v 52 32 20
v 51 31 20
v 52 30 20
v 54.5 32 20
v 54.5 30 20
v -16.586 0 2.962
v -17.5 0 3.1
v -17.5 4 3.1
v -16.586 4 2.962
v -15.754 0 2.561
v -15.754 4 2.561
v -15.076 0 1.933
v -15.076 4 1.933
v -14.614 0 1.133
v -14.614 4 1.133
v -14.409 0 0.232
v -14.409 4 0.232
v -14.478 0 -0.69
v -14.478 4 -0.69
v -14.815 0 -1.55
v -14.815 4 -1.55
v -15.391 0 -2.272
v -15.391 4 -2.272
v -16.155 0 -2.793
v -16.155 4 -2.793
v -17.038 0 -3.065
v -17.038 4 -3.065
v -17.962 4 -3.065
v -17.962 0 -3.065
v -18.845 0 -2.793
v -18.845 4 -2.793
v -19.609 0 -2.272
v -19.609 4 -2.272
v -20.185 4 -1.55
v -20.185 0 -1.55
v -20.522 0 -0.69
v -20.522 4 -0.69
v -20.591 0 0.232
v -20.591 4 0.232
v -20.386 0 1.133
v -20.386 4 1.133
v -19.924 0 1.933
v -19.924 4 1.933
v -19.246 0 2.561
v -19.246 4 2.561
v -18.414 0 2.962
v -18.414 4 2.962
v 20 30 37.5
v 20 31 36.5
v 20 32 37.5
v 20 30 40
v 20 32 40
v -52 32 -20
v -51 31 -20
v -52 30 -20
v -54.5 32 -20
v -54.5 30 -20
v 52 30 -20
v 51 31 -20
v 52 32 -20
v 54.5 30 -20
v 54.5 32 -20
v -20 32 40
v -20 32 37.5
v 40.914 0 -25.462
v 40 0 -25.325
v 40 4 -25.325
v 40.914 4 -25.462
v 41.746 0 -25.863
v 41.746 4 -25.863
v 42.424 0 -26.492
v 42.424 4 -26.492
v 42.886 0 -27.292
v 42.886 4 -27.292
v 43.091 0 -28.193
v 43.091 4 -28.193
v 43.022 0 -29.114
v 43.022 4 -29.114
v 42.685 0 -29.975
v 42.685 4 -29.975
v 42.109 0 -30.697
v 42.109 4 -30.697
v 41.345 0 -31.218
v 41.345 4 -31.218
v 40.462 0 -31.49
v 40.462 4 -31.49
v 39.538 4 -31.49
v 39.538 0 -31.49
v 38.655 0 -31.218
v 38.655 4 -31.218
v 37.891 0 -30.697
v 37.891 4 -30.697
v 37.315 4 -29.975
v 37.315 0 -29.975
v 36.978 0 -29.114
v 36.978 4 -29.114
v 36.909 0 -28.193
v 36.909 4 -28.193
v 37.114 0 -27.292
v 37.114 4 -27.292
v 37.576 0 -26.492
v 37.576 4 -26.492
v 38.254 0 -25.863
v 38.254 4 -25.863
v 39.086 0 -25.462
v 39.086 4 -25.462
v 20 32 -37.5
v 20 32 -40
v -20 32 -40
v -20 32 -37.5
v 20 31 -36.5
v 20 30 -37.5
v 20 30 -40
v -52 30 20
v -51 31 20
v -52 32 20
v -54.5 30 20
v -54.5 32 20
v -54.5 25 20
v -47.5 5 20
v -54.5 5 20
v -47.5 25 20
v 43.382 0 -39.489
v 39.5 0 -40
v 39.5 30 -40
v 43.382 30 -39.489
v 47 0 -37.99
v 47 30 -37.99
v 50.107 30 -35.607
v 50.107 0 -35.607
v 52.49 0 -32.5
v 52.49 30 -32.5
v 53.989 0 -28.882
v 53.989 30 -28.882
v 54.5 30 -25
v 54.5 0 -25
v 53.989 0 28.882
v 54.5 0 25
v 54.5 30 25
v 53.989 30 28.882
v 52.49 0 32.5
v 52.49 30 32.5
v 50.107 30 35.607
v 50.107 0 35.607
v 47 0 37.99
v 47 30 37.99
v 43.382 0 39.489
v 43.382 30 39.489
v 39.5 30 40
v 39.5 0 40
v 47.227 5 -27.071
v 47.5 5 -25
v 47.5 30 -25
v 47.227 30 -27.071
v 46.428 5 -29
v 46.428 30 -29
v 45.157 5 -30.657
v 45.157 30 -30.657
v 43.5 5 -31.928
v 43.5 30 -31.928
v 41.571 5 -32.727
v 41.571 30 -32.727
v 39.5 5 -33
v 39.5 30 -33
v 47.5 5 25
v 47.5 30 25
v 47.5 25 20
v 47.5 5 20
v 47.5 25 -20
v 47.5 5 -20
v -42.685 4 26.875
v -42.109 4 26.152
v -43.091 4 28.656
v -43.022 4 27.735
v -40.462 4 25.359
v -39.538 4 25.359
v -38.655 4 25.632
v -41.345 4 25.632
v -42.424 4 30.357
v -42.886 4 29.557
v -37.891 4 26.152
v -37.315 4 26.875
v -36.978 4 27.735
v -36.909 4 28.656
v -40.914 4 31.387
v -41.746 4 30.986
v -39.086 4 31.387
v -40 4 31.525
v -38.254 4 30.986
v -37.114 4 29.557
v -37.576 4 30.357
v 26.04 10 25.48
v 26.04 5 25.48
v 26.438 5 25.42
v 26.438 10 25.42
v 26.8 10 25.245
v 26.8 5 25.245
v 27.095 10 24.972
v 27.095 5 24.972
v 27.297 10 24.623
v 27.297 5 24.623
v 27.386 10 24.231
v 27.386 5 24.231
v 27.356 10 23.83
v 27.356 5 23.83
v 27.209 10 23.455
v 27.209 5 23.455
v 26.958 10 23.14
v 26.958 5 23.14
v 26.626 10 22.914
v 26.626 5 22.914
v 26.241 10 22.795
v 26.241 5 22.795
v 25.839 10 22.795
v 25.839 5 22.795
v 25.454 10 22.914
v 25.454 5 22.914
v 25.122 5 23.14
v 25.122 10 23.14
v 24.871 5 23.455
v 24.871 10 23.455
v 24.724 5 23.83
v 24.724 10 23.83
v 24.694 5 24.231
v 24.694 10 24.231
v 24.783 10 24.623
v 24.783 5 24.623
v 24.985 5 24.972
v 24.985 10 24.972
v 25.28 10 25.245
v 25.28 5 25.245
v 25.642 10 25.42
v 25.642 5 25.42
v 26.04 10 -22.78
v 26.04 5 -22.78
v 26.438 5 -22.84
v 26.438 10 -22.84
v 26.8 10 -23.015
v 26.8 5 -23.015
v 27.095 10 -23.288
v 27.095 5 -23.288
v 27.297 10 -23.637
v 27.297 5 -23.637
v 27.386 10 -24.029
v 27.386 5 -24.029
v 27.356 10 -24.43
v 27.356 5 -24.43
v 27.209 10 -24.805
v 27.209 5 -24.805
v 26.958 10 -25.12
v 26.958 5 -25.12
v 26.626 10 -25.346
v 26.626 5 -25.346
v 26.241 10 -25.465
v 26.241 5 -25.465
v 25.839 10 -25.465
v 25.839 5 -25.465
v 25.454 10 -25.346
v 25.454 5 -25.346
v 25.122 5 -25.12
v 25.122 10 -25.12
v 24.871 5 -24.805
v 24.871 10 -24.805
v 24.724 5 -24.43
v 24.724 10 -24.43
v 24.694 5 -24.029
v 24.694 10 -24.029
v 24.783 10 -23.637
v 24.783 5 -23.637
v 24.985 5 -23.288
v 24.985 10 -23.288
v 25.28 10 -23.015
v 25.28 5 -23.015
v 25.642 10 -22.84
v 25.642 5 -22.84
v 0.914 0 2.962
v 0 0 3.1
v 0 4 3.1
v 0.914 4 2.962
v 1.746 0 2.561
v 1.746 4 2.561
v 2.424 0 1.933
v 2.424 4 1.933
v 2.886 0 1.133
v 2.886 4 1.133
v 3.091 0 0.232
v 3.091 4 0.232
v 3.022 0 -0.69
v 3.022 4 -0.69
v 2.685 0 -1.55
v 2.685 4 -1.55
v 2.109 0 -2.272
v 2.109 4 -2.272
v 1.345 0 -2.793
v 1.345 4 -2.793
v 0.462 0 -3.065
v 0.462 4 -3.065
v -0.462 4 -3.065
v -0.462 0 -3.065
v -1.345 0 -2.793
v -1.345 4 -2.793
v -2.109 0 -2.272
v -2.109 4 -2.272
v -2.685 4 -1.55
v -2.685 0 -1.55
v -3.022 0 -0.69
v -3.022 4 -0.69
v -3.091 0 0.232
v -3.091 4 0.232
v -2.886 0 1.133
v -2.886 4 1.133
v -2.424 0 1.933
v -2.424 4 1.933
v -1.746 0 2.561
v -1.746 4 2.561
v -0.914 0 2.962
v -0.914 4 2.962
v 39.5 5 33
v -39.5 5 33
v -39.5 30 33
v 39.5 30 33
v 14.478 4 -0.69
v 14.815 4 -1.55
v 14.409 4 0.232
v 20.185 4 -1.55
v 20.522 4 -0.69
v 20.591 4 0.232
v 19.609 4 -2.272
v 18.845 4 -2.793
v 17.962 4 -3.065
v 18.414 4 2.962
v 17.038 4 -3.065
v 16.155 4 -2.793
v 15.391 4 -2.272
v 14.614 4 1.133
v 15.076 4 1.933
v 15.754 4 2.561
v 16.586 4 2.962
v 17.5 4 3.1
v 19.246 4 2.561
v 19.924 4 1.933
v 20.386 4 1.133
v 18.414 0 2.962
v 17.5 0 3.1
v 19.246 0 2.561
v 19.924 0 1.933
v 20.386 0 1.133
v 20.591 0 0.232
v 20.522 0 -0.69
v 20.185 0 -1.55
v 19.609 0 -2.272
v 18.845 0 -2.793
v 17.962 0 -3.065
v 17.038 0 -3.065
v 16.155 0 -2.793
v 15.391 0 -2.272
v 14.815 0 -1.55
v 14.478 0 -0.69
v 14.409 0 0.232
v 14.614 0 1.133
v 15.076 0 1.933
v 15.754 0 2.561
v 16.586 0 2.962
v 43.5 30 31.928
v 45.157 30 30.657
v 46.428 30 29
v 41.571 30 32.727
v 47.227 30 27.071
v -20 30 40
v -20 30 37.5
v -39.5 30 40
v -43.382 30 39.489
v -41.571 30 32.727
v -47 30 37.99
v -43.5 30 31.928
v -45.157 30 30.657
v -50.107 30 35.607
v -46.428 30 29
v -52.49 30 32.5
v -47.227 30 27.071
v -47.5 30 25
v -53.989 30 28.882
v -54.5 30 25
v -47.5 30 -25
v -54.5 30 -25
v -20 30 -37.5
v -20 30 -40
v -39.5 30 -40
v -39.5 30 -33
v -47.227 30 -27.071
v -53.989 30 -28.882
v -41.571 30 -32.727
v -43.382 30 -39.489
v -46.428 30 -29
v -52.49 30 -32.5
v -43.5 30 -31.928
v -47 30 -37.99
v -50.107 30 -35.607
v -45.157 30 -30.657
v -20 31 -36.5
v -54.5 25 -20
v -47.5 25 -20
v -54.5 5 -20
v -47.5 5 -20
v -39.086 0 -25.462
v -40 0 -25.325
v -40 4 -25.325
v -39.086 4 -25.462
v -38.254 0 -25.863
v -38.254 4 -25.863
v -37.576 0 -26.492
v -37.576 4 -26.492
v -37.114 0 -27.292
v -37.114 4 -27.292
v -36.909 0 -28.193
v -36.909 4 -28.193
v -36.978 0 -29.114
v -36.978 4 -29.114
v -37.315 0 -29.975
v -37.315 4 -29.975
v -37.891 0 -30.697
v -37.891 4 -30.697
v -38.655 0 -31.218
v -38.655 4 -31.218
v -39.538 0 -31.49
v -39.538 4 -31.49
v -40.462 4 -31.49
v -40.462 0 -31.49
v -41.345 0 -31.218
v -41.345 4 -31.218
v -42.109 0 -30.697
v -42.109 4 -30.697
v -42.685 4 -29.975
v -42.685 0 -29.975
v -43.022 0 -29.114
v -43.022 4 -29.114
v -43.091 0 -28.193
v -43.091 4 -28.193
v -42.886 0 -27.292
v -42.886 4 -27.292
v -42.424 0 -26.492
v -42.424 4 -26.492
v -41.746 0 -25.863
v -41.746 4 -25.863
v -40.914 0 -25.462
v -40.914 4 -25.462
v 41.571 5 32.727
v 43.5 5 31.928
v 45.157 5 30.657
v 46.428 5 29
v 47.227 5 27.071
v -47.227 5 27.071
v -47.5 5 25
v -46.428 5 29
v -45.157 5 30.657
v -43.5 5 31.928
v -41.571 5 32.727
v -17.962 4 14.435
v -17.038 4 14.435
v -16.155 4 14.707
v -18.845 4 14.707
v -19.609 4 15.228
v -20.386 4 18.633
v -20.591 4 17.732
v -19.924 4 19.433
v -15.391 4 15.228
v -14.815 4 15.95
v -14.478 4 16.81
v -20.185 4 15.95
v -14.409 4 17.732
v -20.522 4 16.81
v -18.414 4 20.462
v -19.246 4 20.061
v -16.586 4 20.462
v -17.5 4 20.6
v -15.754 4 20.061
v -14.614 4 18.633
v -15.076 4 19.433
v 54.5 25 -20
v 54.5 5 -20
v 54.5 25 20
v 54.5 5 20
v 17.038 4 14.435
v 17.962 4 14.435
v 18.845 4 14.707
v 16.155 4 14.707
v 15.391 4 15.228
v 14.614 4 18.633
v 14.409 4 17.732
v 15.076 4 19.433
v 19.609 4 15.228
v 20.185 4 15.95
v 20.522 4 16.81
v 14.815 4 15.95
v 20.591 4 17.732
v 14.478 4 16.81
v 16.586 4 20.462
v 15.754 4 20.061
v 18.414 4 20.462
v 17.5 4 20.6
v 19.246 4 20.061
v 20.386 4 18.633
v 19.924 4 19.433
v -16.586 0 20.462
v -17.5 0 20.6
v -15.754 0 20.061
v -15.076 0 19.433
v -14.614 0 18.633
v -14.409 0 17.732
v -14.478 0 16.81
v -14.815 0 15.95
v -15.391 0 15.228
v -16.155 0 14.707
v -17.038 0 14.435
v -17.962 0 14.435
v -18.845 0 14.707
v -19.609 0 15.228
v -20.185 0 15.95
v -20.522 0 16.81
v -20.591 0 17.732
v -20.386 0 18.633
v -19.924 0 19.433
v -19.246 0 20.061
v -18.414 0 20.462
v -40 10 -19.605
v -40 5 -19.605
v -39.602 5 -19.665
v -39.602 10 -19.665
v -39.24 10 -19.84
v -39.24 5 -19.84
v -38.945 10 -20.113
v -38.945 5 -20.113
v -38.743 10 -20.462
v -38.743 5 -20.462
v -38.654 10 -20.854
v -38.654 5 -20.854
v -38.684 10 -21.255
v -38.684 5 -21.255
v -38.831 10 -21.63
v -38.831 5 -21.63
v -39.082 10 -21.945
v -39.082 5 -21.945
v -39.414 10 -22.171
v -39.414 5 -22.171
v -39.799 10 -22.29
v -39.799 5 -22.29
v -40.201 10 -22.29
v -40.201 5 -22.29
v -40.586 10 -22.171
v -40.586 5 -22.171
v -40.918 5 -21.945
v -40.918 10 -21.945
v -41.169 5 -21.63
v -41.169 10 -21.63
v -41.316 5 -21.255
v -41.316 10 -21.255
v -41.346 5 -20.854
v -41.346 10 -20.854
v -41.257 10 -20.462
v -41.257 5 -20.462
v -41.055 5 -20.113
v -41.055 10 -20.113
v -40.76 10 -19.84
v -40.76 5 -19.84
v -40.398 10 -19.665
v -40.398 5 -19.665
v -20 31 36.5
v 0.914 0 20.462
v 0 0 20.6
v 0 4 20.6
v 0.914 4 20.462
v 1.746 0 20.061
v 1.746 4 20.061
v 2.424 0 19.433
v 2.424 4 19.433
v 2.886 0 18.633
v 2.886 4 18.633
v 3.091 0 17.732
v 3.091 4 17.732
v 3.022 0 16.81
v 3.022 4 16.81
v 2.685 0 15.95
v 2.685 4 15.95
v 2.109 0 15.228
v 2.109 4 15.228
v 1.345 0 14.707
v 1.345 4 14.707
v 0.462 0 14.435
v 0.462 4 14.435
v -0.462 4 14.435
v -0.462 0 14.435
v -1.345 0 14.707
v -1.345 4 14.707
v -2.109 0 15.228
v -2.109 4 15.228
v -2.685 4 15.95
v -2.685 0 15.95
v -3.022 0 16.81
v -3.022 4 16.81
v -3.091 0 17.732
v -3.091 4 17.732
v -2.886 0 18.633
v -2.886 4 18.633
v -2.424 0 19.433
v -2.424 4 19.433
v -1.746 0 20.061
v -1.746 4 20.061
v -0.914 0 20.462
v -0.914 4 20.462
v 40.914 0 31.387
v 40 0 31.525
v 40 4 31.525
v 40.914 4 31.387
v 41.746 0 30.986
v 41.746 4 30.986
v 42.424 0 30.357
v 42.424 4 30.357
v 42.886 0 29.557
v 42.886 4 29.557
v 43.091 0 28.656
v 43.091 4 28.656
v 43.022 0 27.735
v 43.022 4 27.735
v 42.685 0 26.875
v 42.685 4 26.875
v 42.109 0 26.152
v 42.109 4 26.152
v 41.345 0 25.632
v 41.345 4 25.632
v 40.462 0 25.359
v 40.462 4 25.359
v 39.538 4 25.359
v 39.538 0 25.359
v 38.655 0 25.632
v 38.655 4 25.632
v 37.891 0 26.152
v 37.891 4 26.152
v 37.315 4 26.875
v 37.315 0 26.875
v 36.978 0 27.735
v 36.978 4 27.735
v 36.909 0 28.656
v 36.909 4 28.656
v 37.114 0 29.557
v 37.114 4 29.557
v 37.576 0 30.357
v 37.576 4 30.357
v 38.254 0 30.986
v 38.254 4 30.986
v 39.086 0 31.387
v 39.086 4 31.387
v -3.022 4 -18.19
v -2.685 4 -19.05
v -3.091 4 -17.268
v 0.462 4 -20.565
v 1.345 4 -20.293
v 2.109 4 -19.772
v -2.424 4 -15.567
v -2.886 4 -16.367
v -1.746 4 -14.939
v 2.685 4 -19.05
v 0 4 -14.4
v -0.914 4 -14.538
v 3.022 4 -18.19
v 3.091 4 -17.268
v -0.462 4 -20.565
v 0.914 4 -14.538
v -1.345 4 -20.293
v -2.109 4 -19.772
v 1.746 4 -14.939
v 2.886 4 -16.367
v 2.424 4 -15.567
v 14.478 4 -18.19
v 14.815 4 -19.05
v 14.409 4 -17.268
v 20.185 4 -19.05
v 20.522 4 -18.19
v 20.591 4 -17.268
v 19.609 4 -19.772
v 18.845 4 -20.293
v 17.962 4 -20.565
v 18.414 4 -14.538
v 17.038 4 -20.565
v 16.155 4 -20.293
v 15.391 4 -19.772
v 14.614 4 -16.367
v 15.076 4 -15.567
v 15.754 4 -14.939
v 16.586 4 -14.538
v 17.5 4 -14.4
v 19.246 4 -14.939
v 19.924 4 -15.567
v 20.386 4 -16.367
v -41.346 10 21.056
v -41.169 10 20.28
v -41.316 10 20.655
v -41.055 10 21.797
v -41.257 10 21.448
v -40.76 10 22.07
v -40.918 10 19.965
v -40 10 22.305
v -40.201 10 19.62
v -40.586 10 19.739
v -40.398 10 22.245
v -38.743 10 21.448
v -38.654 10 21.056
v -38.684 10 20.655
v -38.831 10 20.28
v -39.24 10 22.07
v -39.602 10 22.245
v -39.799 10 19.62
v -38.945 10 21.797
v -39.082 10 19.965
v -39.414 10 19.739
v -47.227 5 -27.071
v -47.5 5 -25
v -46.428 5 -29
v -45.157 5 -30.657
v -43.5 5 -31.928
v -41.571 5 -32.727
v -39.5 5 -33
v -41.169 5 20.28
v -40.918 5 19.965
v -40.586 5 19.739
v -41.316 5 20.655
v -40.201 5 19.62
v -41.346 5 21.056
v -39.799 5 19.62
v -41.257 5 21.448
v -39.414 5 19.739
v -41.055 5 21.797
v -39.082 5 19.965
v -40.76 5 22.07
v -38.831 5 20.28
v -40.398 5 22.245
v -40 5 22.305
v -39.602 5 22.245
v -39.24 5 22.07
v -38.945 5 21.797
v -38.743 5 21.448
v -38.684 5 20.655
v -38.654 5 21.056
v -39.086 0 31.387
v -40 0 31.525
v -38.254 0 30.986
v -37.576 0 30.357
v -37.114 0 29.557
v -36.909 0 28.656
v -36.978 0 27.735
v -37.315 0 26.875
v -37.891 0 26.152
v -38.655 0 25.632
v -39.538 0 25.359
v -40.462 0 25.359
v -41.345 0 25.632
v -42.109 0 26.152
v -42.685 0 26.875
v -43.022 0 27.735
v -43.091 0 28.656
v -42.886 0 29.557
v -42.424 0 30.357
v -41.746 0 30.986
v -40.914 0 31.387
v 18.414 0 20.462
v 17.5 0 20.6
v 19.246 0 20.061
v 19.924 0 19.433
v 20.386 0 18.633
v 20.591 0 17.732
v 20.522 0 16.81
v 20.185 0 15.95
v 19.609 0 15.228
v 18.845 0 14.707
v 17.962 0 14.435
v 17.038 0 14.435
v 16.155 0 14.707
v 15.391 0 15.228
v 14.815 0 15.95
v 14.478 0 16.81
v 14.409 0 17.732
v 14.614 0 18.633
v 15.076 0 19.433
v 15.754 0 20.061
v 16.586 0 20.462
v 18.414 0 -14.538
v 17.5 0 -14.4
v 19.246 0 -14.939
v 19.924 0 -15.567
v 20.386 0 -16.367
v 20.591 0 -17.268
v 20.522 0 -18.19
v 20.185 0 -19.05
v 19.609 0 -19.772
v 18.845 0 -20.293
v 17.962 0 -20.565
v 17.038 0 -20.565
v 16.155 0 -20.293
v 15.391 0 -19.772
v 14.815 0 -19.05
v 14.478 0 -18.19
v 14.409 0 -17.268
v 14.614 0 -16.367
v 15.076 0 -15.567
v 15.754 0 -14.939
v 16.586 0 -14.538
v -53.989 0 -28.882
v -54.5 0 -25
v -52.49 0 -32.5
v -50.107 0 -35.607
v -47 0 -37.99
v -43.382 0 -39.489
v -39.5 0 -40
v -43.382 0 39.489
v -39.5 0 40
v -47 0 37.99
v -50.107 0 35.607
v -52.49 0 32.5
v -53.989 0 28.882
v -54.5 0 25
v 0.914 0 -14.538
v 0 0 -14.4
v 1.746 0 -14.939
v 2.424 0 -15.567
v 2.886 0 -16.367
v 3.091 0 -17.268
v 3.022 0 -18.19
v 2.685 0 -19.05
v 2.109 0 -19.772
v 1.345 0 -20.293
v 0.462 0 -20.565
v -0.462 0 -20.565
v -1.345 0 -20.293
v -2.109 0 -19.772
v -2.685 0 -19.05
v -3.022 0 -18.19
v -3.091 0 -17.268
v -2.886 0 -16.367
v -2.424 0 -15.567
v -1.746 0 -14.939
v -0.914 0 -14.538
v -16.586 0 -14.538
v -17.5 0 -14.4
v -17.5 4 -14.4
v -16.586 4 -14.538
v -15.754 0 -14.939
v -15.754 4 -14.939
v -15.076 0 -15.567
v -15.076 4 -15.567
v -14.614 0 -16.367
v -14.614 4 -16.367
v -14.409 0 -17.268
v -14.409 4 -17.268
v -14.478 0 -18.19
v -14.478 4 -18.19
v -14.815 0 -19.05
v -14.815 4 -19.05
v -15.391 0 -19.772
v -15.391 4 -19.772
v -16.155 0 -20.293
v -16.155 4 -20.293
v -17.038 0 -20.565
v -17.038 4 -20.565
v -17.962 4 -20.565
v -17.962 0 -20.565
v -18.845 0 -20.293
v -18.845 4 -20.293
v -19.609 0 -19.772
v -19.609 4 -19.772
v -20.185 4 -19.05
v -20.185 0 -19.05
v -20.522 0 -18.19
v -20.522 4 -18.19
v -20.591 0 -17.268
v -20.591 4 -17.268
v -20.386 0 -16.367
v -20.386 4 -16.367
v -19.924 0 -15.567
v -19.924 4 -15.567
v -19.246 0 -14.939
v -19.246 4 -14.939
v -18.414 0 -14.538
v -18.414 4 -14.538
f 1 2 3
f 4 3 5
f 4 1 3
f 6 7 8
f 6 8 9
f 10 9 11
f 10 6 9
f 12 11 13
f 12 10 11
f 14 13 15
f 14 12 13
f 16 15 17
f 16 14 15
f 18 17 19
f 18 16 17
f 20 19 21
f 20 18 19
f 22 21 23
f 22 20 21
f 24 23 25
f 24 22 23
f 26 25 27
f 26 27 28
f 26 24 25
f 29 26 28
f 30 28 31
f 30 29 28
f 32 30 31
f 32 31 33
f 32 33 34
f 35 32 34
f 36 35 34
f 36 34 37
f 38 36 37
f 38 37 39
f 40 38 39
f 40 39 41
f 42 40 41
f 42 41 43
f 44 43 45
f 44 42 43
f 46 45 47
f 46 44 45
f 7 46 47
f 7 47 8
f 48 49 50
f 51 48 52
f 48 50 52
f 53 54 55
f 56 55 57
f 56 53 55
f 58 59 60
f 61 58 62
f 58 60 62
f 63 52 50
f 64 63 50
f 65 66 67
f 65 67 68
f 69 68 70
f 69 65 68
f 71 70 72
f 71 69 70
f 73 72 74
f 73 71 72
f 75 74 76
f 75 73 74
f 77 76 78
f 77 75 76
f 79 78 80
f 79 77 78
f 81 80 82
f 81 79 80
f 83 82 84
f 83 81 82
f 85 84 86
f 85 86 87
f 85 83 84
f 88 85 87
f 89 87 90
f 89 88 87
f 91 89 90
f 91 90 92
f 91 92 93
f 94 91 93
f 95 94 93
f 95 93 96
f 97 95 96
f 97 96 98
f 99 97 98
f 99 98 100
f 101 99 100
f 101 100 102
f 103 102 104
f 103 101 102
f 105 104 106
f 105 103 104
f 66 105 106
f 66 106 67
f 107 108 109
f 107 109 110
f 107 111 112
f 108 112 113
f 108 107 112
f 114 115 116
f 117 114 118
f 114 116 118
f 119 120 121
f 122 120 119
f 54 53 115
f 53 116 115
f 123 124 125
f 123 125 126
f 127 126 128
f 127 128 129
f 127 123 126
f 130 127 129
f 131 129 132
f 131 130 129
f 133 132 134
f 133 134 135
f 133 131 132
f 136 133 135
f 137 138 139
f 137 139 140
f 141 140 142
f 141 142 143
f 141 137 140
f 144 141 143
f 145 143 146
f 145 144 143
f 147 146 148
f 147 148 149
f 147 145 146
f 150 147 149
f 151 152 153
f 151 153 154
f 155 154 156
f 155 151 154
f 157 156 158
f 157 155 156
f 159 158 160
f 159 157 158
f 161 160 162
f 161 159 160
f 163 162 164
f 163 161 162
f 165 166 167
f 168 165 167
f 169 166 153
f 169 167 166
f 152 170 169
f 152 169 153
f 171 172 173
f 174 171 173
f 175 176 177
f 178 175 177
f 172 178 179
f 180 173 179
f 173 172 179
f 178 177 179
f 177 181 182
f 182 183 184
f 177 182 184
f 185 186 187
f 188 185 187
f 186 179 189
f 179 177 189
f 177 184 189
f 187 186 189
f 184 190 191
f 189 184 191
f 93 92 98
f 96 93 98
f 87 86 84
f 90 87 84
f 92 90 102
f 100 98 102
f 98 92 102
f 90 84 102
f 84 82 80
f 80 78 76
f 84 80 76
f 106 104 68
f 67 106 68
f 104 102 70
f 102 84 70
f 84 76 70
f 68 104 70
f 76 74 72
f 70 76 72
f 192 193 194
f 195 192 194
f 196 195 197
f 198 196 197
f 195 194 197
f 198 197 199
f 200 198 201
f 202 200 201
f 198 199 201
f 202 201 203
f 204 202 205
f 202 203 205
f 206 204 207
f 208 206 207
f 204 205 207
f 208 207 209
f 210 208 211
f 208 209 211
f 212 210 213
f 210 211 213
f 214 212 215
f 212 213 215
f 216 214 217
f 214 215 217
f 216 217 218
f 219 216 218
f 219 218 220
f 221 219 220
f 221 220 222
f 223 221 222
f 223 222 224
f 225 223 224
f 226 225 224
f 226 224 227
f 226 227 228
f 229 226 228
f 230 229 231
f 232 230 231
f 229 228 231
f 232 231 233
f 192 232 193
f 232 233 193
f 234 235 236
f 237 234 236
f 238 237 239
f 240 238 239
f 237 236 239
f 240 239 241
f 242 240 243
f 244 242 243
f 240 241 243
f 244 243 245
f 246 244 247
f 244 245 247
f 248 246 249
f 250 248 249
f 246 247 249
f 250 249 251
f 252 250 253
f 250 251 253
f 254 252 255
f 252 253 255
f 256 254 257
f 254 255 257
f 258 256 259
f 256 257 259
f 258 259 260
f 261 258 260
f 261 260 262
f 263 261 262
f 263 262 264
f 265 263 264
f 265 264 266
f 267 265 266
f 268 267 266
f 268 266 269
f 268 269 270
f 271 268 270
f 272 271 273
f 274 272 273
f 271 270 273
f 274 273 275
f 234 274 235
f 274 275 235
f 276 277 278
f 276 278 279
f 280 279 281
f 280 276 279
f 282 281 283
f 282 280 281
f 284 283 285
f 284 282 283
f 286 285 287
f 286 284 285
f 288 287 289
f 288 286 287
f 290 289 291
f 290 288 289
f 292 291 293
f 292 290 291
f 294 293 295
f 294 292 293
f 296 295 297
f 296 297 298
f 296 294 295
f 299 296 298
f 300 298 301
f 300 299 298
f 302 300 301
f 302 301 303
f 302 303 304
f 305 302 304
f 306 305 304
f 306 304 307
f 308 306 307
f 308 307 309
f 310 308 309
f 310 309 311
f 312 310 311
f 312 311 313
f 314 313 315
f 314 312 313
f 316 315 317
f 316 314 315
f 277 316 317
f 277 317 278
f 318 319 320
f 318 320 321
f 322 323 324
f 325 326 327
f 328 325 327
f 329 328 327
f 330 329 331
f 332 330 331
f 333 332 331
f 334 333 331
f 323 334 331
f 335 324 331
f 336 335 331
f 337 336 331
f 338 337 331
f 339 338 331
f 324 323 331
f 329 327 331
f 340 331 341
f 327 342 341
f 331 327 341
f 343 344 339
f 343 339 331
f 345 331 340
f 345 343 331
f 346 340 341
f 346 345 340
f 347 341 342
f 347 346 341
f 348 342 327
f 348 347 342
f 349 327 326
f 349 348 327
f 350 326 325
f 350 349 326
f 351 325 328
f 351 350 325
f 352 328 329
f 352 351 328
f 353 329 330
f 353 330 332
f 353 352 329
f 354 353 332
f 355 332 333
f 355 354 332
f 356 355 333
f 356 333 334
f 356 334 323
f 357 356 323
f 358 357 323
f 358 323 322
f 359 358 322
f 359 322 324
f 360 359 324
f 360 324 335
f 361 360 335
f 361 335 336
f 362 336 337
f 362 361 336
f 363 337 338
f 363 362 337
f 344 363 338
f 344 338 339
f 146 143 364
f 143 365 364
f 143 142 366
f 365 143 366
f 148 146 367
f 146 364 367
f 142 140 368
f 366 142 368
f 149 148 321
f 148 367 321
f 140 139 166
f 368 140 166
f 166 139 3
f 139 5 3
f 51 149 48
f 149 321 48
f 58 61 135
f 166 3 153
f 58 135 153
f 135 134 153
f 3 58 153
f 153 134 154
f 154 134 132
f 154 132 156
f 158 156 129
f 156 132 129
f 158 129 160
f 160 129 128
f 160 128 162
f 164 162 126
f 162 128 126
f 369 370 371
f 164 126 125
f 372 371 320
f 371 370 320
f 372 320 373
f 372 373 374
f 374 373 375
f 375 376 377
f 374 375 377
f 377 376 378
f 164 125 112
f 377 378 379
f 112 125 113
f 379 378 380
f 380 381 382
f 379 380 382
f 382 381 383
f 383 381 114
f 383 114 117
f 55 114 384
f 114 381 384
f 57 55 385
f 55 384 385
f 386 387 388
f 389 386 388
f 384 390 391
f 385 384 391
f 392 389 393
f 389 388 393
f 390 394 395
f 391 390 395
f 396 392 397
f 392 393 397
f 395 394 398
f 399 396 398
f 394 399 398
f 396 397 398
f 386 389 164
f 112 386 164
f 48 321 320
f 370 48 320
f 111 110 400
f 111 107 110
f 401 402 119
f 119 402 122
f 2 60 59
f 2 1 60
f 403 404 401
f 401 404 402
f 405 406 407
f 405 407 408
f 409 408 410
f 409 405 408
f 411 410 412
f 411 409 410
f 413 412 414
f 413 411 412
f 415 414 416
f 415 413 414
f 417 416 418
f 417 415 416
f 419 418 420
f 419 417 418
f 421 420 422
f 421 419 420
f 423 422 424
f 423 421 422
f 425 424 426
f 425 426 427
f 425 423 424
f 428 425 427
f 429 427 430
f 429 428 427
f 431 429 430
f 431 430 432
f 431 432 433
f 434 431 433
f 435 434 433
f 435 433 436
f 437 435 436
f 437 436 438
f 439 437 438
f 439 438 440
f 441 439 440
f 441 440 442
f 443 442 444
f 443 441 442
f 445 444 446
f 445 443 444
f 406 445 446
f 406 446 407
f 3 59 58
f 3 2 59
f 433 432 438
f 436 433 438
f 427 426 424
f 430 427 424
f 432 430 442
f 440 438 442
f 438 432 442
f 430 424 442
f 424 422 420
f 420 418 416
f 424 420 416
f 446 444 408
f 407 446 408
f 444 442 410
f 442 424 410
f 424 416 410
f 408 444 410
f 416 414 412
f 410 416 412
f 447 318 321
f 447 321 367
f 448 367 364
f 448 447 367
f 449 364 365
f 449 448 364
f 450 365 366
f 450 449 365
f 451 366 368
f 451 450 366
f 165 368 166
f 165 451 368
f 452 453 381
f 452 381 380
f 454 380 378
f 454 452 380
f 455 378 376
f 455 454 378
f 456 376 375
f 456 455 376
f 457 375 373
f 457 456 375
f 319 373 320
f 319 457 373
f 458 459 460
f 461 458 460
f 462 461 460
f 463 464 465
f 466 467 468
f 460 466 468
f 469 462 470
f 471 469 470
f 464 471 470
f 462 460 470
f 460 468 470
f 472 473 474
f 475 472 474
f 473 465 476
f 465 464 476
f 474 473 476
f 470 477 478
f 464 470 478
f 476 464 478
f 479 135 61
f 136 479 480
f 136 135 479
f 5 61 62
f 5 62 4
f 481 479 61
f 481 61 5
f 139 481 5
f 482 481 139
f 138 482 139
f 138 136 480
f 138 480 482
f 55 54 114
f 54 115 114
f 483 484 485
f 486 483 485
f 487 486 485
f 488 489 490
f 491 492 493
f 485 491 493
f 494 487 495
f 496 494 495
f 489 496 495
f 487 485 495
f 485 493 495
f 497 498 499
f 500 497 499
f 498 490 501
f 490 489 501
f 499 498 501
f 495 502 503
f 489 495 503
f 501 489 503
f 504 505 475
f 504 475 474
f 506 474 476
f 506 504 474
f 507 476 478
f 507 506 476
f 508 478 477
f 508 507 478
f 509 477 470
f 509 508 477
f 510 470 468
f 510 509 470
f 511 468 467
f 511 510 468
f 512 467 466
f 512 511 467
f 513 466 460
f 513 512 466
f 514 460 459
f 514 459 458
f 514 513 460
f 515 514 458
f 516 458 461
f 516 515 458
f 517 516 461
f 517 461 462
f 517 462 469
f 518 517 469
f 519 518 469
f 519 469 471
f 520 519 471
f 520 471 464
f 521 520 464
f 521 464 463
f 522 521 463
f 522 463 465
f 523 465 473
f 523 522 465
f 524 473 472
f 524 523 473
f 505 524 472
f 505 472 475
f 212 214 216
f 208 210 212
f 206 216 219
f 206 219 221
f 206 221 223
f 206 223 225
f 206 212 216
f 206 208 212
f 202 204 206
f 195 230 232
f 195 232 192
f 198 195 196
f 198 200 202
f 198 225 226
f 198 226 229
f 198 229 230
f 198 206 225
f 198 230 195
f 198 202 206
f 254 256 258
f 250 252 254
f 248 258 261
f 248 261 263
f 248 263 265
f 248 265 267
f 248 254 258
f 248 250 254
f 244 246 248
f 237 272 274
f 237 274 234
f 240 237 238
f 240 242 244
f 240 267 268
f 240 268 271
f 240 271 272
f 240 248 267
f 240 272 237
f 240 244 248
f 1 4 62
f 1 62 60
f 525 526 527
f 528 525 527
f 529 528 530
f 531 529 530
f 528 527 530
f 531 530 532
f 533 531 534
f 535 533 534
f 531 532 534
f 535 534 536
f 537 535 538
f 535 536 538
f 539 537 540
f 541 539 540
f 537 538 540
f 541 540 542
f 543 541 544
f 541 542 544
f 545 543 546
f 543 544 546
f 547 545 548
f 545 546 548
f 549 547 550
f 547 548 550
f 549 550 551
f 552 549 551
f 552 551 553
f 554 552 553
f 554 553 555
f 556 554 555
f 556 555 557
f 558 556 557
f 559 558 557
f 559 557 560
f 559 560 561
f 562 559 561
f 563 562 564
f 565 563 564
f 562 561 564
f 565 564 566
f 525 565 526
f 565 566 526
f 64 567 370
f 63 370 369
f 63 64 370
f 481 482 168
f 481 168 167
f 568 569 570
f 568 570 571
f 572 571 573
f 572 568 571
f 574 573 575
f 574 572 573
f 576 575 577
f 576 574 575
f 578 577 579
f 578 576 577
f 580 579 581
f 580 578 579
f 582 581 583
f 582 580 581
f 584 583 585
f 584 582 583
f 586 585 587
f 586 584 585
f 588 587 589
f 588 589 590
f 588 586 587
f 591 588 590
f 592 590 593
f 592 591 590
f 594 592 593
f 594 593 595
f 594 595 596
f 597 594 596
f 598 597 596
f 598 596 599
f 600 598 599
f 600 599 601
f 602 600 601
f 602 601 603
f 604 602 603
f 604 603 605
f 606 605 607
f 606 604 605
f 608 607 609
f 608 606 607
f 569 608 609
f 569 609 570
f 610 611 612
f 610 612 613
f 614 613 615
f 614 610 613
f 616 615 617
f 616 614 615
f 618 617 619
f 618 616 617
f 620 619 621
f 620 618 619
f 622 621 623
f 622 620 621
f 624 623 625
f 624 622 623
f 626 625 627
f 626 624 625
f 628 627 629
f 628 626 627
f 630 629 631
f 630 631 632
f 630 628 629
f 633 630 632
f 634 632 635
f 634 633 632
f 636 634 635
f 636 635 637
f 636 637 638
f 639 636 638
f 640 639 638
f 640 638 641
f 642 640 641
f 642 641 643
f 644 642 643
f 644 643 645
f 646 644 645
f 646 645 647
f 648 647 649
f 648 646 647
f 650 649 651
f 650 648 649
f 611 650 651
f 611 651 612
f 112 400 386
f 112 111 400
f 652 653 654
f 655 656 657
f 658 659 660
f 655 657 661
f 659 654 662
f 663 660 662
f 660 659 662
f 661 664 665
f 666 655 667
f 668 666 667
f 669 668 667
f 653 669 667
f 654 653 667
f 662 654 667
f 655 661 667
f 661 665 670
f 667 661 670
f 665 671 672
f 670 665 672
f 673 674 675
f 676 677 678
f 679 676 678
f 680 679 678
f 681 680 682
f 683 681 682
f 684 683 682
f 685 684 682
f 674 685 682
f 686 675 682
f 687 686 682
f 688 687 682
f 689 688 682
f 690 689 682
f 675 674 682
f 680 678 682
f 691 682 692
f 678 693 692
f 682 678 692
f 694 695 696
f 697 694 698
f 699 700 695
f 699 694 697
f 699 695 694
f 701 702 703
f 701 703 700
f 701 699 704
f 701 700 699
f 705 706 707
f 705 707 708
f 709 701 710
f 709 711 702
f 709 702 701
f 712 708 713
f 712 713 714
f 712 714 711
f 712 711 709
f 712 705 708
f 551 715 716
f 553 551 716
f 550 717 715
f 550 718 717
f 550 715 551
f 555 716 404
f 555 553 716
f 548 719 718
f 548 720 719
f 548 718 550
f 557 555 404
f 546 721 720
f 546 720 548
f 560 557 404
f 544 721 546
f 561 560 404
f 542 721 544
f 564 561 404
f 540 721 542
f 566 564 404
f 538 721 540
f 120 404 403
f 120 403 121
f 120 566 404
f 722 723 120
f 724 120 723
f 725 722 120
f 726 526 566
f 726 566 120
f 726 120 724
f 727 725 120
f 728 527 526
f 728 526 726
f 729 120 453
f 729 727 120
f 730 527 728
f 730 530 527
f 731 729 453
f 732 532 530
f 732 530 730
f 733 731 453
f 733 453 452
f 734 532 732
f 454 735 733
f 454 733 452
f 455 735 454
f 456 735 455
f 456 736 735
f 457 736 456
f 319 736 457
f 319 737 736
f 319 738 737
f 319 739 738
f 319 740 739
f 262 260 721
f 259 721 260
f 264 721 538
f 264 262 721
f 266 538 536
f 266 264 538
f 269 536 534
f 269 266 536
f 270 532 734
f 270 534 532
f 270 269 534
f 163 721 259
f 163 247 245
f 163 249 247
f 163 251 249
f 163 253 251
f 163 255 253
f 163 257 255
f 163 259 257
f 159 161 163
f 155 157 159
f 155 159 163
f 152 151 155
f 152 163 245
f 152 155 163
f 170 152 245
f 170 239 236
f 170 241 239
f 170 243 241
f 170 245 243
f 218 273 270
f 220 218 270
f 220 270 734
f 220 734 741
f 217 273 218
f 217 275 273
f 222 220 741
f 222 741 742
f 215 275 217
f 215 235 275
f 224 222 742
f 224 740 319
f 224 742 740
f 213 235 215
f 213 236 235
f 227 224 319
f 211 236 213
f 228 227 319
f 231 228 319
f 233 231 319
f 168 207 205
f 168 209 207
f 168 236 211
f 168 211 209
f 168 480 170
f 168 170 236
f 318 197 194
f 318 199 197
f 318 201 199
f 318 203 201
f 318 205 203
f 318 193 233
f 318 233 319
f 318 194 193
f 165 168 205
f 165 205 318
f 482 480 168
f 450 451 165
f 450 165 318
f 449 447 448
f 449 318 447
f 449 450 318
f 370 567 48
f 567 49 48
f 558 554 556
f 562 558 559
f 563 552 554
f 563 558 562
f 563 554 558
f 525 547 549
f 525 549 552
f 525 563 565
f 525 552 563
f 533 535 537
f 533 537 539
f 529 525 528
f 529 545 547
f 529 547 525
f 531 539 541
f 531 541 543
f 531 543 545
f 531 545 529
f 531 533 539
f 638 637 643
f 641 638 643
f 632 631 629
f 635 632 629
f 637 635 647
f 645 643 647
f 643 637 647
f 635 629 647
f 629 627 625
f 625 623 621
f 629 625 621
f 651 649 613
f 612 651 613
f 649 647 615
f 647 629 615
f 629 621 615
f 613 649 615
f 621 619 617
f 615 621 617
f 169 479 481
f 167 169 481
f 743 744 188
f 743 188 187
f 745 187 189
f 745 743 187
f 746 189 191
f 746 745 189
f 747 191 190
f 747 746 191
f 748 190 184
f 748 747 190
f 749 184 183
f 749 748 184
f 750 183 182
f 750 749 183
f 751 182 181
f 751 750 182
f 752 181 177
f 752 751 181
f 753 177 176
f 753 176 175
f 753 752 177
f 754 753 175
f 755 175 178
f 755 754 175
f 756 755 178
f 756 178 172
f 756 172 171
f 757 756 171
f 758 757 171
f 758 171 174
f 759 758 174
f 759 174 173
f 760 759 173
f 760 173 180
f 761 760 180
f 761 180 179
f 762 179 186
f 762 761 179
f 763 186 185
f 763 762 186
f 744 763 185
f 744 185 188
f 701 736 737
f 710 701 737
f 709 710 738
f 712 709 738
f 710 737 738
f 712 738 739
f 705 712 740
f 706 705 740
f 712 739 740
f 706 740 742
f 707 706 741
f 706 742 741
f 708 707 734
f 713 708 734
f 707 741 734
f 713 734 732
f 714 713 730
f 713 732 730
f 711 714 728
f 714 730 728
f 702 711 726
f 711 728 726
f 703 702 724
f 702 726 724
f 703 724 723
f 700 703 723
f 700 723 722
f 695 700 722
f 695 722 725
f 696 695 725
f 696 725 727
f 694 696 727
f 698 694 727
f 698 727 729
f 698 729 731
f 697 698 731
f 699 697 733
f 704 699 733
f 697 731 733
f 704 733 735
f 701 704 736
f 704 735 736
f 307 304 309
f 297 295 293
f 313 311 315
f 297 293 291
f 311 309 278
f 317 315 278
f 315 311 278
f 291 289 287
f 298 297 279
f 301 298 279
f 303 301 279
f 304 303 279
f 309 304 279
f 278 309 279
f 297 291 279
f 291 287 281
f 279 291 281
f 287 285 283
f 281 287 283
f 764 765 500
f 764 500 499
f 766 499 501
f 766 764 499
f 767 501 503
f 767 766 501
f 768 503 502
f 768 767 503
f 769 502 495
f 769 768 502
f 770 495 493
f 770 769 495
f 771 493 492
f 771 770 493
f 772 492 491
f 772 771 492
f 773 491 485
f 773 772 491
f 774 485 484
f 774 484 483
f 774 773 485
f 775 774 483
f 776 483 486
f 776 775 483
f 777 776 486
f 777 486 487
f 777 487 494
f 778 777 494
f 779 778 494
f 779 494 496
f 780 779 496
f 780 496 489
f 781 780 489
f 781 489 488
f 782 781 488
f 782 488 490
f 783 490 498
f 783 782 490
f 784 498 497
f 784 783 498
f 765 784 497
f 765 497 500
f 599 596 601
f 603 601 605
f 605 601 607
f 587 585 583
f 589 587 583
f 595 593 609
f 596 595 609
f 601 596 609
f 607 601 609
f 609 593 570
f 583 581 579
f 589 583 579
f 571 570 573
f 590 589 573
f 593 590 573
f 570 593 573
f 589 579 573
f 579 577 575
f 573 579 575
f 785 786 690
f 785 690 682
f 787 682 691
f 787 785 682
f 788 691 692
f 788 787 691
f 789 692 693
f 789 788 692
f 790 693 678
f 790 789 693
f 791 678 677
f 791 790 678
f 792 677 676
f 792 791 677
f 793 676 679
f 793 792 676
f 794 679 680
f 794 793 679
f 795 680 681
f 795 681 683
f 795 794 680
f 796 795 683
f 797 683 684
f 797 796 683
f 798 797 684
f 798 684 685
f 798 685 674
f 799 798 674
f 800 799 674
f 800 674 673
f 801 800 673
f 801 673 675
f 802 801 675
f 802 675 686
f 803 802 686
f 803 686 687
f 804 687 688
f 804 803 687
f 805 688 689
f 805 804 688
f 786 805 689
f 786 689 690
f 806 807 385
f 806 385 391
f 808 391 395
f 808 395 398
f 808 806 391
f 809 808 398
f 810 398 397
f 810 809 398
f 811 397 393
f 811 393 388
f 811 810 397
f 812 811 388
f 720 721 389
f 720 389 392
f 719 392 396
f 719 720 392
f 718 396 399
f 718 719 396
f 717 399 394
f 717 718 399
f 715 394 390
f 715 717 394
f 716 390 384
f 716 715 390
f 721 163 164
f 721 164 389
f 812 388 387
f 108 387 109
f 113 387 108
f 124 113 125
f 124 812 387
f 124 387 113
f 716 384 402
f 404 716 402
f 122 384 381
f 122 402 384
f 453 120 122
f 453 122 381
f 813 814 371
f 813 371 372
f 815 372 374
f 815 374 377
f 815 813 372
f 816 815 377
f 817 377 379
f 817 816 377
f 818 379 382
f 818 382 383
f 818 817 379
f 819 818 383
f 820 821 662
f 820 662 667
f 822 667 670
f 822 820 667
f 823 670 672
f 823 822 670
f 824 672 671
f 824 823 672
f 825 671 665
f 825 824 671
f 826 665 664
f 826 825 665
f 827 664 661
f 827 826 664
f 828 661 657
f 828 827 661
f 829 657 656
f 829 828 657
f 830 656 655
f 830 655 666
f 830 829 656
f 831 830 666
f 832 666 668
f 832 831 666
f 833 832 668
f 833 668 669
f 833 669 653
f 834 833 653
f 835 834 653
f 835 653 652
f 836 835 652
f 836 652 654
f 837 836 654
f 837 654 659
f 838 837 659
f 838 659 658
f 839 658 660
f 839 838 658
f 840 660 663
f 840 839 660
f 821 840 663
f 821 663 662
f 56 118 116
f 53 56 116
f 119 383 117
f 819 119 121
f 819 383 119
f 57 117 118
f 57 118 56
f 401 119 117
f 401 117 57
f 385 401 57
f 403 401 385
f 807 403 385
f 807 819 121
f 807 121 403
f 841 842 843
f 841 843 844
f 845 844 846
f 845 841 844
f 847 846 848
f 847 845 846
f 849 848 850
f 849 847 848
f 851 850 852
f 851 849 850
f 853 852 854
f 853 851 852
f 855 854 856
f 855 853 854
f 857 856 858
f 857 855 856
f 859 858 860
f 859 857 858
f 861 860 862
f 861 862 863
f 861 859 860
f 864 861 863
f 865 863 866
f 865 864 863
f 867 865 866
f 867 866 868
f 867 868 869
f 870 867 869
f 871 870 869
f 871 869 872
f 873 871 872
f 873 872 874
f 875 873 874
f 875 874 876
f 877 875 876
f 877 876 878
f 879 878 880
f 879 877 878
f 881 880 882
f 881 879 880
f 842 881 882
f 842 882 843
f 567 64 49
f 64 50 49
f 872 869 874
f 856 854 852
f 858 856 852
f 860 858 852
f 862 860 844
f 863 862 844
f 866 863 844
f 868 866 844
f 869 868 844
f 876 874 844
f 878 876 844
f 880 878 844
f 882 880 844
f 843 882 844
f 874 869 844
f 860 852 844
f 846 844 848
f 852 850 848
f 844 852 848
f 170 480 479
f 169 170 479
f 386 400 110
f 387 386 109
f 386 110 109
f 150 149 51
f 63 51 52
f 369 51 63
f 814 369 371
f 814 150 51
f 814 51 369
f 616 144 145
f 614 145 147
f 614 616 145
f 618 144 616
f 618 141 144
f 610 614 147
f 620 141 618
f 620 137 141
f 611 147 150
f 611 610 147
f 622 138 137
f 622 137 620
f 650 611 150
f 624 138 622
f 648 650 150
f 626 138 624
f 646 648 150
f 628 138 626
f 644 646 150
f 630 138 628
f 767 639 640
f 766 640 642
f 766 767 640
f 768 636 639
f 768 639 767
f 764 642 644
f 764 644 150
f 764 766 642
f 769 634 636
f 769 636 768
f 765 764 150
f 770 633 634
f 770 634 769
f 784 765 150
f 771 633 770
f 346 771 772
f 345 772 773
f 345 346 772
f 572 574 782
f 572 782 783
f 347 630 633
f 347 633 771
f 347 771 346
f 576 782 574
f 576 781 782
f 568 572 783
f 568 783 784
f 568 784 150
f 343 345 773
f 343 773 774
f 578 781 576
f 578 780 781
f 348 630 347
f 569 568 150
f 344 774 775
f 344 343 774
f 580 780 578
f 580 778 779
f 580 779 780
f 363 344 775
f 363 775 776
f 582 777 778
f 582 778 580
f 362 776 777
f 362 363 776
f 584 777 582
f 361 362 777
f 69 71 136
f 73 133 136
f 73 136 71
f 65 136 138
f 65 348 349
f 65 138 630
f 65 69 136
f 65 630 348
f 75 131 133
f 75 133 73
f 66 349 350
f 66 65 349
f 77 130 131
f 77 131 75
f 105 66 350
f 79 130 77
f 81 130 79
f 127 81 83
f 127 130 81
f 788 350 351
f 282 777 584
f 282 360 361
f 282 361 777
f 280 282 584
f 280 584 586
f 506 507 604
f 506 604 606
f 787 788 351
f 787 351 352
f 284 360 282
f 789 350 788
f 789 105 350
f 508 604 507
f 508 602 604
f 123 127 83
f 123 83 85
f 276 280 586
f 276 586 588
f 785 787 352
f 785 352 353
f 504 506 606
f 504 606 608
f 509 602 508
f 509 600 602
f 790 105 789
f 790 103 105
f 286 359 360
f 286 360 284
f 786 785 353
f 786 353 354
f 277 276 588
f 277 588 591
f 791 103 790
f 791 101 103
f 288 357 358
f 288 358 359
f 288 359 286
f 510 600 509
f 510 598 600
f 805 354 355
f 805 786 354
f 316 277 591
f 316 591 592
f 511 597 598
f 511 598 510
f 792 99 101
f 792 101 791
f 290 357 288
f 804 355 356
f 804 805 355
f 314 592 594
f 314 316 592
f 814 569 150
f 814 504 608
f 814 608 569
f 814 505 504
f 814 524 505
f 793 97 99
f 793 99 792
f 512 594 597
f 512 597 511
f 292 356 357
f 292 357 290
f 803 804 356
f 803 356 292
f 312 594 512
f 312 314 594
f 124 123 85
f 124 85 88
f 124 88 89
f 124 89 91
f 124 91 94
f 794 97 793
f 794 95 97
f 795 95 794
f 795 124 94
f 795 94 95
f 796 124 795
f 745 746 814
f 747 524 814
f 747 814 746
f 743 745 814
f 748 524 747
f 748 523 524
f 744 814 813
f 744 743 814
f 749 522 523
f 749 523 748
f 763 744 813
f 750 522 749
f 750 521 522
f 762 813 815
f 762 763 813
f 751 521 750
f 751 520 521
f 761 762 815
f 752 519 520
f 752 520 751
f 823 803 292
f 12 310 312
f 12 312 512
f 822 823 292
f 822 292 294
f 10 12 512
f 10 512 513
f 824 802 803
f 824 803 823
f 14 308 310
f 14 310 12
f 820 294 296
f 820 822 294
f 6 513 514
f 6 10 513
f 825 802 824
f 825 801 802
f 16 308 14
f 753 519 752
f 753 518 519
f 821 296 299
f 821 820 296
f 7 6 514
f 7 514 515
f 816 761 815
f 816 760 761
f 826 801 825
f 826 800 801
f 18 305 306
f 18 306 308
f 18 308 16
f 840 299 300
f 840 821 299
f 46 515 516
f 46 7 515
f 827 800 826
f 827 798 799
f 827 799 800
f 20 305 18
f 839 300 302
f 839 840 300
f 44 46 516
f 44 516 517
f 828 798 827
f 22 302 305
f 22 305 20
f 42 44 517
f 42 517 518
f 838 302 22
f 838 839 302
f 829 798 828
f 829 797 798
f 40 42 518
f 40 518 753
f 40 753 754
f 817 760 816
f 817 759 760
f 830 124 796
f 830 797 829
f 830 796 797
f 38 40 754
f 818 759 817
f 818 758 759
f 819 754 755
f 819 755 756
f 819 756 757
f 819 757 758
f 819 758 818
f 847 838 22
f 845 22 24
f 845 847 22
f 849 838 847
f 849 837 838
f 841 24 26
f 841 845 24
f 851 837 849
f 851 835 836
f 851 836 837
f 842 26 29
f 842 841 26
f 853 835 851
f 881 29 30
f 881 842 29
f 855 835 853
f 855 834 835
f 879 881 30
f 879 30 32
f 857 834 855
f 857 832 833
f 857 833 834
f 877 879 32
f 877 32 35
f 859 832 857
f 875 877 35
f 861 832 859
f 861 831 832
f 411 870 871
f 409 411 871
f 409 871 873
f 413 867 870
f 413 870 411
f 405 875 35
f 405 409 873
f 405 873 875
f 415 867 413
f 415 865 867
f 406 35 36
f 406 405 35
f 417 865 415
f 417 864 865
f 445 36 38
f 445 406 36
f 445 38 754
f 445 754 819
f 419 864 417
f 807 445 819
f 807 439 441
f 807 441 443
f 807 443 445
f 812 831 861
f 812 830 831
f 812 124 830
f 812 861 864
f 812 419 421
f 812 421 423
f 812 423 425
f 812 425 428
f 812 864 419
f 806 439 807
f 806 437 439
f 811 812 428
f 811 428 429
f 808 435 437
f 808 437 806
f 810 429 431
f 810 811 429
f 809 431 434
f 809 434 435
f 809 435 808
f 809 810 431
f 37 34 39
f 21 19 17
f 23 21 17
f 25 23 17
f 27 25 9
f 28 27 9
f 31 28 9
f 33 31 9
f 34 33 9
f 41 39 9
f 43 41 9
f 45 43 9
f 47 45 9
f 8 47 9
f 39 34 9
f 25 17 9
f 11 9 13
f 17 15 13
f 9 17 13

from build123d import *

# Parameters (mm, degrees)
BOSS_EXTRUDE1_DEPTH     = 5
SKETCH4_R               = 3.1
CUT_EXTRUDE1_DEPTH      = 4
BOSS_EXTRUDE3_DEPTH     = 30
CUT_EXTRUDE2_DEPTH      = 120.920807202
CUT_EXTRUDE2_DEPTH_BACK = 120.920807202
SKETCH7_W               = 40
SKETCH7_H               = 20
BOSS_EXTRUDE2_START     = 5
SKETCH3_R               = 1.35
BOSS_EXTRUDE2_DEPTH     = 5
BOSS_EXTRUDE6_DEPTH     = 20
BOSS_EXTRUDE7_DEPTH     = 20


with BuildPart() as part:
    # Sketch1 → Boss-Extrude1 (new body)
    with BuildSketch(Plane(origin=(0, 0, 0), x_dir=(1, 0, 0), z_dir=(0, 1, 0))):
        with BuildLine():
            Line((-39.5, 40), (39.5, 40))
            ThreePointArc((39.5, 40), (50.106601718, 35.606601718), (54.5, 25))
            Line((54.5, 25), (54.5, -25))
            ThreePointArc((54.5, -25), (50.106601718, -35.606601718), (39.5, -40))
            Line((39.5, -40), (-39.5, -40))
            ThreePointArc((-39.5, -40), (-50.106601718, -35.606601718), (-54.5, -25))
            Line((-54.5, -25), (-54.5, 25))
            ThreePointArc((-54.5, 25), (-50.106601718, 35.606601718), (-39.5, 40))
        make_face()
    extrude(amount=BOSS_EXTRUDE1_DEPTH)

    # Sketch4 → Cut-Extrude1 (cut)
    with BuildSketch(Plane(origin=(0, 0, 0), x_dir=(1, 0, 0), z_dir=(0, 1, 0))):
        with Locations(Location((-40, -28.424678982, 0), (0, 0, 270))):
            Circle(SKETCH4_R)
        with Locations(Location((40, -28.424678982, 0), (0, 0, 270))):
            Circle(SKETCH4_R)
        with Locations(Location((40, 28.424678982, 0), (0, 0, 270))):
            Circle(SKETCH4_R)
        with Locations(Location((-40, 28.424678982, 0), (0, 0, 270))):
            Circle(SKETCH4_R)
        with Locations(Location((-17.5, 0, 0), (0, 0, 270))):
            Circle(SKETCH4_R)
        with Locations(Location((0, -17.5, 0), (0, 0, 270))):
            Circle(SKETCH4_R)
        with Locations(Location((17.5, 0, 0), (0, 0, 270))):
            Circle(SKETCH4_R)
        with Locations(Location((0, 17.5, 0), (0, 0, 270))):
            Circle(SKETCH4_R)
        with Locations(Location((-17.5, 17.5, 0), (0, 0, 270))):
            Circle(SKETCH4_R)
        with Locations(Location((17.5, 17.5, 0), (0, 0, 270))):
            Circle(SKETCH4_R)
        with Locations(Location((17.5, -17.5, 0), (0, 0, 270))):
            Circle(SKETCH4_R)
        with Locations(Location((-17.5, -17.5, 0), (0, 0, 270))):
            Circle(SKETCH4_R)
        with Locations(Location((0, 0, 0), (0, 0, 270))):
            Circle(SKETCH4_R)
    extrude(amount=CUT_EXTRUDE1_DEPTH, mode=Mode.SUBTRACT)

    # Sketch1<3> → Boss-Extrude3 (add)
    with BuildSketch(Plane(origin=(0, 0, 0), x_dir=(1, 0, 0), z_dir=(0, 1, 0))):
        with BuildLine():
            Line((-39.5, 40), (39.5, 40))
            ThreePointArc((39.5, 40), (50.106601718, 35.606601718), (54.5, 25))
            Line((54.5, 25), (54.5, -25))
            ThreePointArc((54.5, -25), (50.106601718, -35.606601718), (39.5, -40))
            Line((39.5, -40), (-39.5, -40))
            ThreePointArc((-39.5, -40), (-50.106601718, -35.606601718), (-54.5, -25))
            Line((-54.5, -25), (-54.5, 25))
            ThreePointArc((-54.5, 25), (-50.106601718, 35.606601718), (-39.5, 40))
        make_face()
        with BuildLine():
            ThreePointArc((-39.5, 33), (-45.156854249, 30.656854249), (-47.5, 25))
            Line((-47.5, 25), (-47.5, -25))
            ThreePointArc((-47.5, -25), (-45.156854249, -30.656854249), (-39.5, -33))
            Line((-39.5, -33), (39.5, -33))
            ThreePointArc((39.5, -33), (45.156854249, -30.656854249), (47.5, -25))
            Line((47.5, -25), (47.5, 25))
            ThreePointArc((47.5, 25), (45.156854249, 30.656854249), (39.5, 33))
            Line((39.5, 33), (-39.5, 33))
        make_face(mode=Mode.SUBTRACT)
    extrude(amount=BOSS_EXTRUDE3_DEPTH)

    # Sketch7 → Cut-Extrude2 (cut, two sides: drawn at the far end of the back side and taken through both)
    with BuildSketch(Plane.ZY.offset(54.5).offset(-CUT_EXTRUDE2_DEPTH_BACK)):
        with Locations((0, 15)):
            Rectangle(SKETCH7_W, SKETCH7_H)
    extrude(amount=CUT_EXTRUDE2_DEPTH + CUT_EXTRUDE2_DEPTH_BACK, mode=Mode.SUBTRACT)

    # Sketch3 → Boss-Extrude2 (add)
    with BuildSketch(Plane(origin=(0, 0, 0), x_dir=(1, 0, 0), z_dir=(0, 1, 0)).offset(BOSS_EXTRUDE2_START)):
        with Locations(Location((26.04, 24.13, 0), (0, 0, 270))):
            Circle(SKETCH3_R)
        with Locations(Location((-40, 20.955, 0), (0, 0, 270))):
            Circle(SKETCH3_R)
        with Locations(Location((-40, -20.955, 0), (0, 0, 270))):
            Circle(SKETCH3_R)
        with Locations(Location((26.04, -24.13, 0), (0, 0, 270))):
            Circle(SKETCH3_R)
    extrude(amount=BOSS_EXTRUDE2_DEPTH)

    # Sketch10 → Boss-Extrude6 (add, symmetric)
    with BuildSketch(Plane(origin=(0, 0, 0), x_dir=(0, 0, -1), z_dir=(1, 0, 0))):
        Polygon((37.5, 30), (40, 30), (40, 32), (37.5, 32), (36.5, 31), align=None)
    boss_extrude6 = extrude(amount=BOSS_EXTRUDE6_DEPTH, both=True)

    # Mirror2: Boss-Extrude6 across plane
    add(boss_extrude6.mirror(Plane.XY))

    # Sketch12 → Boss-Extrude7 (add, symmetric)
    with BuildSketch(Plane.XY):
        Polygon((52, 30), (54.5, 30), (54.5, 32), (52, 32), (51, 31), align=None)
    boss_extrude7 = extrude(amount=BOSS_EXTRUDE7_DEPTH, both=True)

    # Mirror3: Boss-Extrude7 across plane
    add(boss_extrude7.mirror(Plane(origin=(0, 0, 0), x_dir=(0, 0, 1), z_dir=(1, 0, 0))))


solid = part.part
